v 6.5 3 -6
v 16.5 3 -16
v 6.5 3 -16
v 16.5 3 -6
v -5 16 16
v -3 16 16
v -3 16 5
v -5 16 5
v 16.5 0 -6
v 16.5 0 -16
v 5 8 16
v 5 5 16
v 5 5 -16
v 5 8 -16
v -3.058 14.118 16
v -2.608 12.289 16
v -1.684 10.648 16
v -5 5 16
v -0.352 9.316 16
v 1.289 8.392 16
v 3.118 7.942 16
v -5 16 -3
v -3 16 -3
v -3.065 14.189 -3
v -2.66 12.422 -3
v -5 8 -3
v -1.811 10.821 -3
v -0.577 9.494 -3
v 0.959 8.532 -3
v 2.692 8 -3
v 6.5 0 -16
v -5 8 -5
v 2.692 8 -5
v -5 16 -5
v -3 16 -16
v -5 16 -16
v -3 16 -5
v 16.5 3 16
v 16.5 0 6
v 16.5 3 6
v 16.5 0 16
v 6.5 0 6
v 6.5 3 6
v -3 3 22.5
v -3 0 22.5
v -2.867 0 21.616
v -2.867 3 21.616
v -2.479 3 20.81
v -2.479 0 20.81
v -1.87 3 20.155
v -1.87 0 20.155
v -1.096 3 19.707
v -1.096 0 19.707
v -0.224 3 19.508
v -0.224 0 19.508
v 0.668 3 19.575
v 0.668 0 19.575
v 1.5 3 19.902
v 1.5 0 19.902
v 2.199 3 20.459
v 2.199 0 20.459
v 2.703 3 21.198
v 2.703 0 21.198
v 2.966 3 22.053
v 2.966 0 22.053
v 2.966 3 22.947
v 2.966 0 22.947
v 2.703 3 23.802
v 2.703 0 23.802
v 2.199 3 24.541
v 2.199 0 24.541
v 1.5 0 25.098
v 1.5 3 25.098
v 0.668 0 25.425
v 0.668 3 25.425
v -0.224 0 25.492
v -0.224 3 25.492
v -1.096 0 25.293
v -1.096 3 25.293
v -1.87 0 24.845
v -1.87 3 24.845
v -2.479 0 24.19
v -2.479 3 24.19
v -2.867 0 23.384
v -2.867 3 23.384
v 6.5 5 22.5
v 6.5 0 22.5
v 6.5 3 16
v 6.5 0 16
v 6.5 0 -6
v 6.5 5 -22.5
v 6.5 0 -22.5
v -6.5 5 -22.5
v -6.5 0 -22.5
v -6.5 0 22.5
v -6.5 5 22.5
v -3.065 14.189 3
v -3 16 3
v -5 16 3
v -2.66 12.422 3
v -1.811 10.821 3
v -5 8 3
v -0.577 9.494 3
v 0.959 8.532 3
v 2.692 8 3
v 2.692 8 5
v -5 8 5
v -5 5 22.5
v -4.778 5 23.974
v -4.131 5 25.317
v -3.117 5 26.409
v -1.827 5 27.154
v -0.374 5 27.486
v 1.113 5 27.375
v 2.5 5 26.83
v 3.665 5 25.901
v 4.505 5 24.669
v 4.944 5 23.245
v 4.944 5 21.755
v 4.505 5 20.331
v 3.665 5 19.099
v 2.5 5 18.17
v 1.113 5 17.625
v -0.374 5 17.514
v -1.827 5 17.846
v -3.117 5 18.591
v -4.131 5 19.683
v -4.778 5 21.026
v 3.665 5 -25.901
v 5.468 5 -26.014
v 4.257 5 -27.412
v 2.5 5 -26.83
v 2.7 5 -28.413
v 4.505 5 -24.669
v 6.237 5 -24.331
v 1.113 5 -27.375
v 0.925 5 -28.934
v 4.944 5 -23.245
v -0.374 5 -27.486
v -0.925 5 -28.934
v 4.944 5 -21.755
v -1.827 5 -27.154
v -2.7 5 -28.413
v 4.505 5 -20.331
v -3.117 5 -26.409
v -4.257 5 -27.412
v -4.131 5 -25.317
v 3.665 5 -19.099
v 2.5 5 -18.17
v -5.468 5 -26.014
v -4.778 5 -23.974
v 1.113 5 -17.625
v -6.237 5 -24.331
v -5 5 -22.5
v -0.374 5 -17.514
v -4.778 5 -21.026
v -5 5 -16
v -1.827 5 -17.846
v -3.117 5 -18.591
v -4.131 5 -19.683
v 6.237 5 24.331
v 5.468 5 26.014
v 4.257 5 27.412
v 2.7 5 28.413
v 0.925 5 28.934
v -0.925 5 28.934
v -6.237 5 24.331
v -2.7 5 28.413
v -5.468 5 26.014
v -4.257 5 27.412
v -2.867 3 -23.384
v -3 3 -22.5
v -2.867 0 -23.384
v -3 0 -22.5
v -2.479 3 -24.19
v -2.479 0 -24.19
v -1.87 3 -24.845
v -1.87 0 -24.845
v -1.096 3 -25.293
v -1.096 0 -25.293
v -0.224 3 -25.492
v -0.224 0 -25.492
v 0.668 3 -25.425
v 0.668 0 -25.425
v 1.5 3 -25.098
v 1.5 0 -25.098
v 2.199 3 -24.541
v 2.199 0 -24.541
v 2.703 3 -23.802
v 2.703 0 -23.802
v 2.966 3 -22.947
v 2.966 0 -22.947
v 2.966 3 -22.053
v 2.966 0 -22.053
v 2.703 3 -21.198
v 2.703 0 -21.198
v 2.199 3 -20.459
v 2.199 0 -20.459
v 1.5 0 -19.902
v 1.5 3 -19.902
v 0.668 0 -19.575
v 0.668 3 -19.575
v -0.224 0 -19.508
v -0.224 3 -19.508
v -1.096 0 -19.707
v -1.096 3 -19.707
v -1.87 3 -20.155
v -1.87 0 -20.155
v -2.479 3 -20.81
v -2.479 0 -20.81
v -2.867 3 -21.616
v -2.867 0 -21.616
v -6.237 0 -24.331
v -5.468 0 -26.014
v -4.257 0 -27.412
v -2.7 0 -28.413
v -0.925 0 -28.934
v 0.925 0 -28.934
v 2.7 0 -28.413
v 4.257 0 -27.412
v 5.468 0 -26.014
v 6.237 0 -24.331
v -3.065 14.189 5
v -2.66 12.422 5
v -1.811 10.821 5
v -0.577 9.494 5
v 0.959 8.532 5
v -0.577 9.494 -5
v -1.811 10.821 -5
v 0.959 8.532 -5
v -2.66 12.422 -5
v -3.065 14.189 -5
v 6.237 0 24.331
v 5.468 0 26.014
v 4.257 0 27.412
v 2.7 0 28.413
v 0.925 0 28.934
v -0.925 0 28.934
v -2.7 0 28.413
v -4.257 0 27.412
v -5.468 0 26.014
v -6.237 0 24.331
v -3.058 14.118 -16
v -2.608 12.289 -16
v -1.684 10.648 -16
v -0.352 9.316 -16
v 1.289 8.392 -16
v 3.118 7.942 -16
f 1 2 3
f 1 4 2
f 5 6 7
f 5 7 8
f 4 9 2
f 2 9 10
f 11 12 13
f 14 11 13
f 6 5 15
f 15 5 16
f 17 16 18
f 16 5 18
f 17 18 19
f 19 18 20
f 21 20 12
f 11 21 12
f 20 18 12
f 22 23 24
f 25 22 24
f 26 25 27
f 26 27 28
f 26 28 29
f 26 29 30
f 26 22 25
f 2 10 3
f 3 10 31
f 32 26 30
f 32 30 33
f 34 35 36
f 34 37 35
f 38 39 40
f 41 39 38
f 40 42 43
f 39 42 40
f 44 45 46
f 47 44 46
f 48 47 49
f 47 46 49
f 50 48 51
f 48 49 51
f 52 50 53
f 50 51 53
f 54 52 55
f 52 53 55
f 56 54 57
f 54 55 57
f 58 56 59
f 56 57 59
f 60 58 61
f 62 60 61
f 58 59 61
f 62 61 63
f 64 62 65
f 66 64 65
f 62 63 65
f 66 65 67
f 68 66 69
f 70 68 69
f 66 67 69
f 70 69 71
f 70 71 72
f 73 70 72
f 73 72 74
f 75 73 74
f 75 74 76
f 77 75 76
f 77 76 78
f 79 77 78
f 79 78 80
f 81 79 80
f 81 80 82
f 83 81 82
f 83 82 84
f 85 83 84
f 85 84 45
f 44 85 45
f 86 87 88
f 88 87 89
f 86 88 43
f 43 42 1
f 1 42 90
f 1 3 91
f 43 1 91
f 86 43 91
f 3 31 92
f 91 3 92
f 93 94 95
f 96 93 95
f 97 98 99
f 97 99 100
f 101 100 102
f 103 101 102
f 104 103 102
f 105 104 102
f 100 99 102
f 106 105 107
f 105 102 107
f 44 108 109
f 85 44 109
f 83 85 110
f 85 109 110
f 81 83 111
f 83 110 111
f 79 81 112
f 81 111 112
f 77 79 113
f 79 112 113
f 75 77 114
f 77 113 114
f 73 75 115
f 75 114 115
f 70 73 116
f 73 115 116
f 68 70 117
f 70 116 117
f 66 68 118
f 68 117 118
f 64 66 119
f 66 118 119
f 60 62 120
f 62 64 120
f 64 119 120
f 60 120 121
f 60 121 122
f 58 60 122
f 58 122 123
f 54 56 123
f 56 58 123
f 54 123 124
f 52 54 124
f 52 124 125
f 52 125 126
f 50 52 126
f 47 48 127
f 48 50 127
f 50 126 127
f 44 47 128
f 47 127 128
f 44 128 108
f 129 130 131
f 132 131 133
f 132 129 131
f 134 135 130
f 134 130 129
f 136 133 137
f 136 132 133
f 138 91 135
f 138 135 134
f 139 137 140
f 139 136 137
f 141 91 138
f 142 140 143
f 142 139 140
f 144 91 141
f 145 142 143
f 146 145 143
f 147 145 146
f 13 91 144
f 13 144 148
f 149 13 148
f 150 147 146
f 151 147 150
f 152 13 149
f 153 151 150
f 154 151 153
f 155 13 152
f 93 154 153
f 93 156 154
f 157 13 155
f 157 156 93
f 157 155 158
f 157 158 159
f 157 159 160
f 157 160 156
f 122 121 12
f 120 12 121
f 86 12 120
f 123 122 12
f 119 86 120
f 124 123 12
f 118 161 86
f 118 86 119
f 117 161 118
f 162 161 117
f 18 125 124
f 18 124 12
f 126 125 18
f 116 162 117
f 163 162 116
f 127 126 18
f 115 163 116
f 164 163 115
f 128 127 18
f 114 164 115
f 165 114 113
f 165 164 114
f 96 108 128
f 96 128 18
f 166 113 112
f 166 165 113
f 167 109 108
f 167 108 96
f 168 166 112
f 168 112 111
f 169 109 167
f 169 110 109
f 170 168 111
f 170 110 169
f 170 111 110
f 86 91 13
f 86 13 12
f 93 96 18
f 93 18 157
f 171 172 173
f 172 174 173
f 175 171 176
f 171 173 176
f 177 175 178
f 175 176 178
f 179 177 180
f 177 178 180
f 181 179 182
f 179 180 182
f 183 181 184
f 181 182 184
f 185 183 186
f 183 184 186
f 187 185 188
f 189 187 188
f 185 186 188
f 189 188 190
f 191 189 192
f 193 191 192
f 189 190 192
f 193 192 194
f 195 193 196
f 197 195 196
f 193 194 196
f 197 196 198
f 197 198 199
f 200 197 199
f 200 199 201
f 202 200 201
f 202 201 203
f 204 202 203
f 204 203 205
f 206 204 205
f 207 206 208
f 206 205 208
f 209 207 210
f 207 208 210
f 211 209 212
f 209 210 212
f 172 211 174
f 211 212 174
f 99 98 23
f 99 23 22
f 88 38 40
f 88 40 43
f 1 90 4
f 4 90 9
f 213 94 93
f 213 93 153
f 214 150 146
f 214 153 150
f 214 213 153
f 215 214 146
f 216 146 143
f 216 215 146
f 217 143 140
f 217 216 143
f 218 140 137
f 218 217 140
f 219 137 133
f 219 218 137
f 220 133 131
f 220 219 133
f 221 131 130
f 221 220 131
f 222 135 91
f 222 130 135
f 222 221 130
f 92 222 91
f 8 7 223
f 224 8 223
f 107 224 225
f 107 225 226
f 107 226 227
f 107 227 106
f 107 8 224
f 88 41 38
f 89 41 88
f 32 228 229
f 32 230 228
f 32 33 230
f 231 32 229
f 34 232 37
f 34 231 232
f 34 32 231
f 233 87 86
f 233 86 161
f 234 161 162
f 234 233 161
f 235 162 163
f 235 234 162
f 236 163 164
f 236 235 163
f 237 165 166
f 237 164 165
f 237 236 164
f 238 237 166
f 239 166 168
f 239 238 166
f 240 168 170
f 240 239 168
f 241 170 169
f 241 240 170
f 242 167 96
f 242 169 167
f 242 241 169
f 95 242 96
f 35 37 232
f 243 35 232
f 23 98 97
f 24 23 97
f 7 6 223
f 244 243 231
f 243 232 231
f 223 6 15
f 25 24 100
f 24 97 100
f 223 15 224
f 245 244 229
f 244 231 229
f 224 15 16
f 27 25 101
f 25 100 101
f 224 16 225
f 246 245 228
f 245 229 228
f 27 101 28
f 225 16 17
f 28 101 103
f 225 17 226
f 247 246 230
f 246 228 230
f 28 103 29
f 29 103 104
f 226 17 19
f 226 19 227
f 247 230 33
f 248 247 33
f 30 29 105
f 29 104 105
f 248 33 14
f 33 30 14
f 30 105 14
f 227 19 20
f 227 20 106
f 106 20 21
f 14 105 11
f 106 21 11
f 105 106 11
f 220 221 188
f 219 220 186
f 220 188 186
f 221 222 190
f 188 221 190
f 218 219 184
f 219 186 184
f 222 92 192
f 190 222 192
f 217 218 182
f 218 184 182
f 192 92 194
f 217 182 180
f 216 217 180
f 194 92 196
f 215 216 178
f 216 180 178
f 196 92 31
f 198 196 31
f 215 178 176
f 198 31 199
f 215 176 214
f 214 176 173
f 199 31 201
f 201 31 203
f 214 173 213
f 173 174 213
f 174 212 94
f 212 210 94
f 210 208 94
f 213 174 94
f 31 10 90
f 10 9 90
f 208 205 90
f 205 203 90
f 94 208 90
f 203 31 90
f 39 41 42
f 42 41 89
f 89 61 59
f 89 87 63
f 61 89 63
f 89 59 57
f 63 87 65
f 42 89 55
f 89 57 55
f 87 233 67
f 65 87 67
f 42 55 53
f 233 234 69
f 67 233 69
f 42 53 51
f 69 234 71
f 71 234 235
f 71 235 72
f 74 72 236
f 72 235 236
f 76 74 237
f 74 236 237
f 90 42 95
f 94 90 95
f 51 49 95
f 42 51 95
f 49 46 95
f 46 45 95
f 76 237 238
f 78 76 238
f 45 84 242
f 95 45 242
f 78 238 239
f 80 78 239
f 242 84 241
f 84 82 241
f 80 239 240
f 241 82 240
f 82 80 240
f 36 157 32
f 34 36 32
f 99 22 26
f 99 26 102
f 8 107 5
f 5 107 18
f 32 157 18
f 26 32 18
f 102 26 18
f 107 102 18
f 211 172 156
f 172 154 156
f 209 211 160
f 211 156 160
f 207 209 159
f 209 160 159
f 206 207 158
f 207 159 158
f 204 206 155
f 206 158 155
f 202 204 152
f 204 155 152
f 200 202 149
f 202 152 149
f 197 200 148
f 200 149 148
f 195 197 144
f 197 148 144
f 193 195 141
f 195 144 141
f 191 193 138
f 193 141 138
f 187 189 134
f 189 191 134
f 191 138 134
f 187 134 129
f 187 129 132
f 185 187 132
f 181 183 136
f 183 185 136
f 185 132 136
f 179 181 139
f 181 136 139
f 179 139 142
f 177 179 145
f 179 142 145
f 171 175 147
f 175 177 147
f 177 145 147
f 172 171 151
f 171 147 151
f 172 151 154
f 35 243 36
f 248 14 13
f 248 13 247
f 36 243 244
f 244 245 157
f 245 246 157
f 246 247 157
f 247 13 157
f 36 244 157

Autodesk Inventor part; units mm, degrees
ref_plane "YZ Plane" through (0, 0, 0) normal (1, 0, 0) x (0, 1, 0)
ref_plane "XZ Plane" through (0, 0, 0) normal (0, 1, 0) x (-1, 0, 0)
ref_plane "XY Plane" through (0, 0, 0) normal (0, 0, 1) x (1, 0, 0)
sketch "Sketch1" plane through (0, 0, 0) normal (0, 1, 0) x (-1, 0, 0)
  line L0 (-6.5, 22.5) -> (-6.5, -22.5)
  line L1 (-6.5, -22.5) -> (6.5, -22.5)
  line L2 (6.5, -22.5) -> (6.5, 22.5)
  line L3 (6.5, 22.5) -> (-6.5, 22.5)
  line L4 (-6.5, 22.5) -> (6.5, -22.5) construction
  line L5 (-6.5, -22.5) -> (6.5, 22.5) construction
  circle A0 centre (0, -22.5) radius 3
  circle A1 centre (0, -22.5) radius 6.5
  circle A2 centre (0, 22.5) radius 3
  circle A3 centre (0, 22.5) radius 6.5
  line L6 (-5, 16) -> (-5, -16)
  line L7 (-5, -16) -> (5, -16)
  line L8 (5, -16) -> (5, 16)
  line L9 (5, 16) -> (-5, 16)
  line L10 (-5, 16) -> (5, -16) construction
  line L11 (-5, -16) -> (5, 16) construction
  line L12 (-6.5, -16) -> (-6.5, -6)
  line L13 (-6.5, -6) -> (-16.5, -6)
  line L14 (-16.5, -6) -> (-16.5, -16)
  line L15 (-16.5, -16) -> (-6.5, -16)
  line L16 (-6.5, 16) -> (-6.5, 6)
  line L17 (-6.5, 6) -> (-16.5, 6)
  line L18 (-16.5, 6) -> (-16.5, 16)
  line L19 (-16.5, 16) -> (-6.5, 16)
  point P0 (0, 0)
  dimension "d0" = 45
  dimension "d1" = 13
  dimension "d2" = 6
  dimension "d3" = 6
  dimension "d4" = 10
  dimension "d5" = 10
  dimension "d6" = 10
  dimension "d7" = 10
  dimension "d8" = 10
extrude "Extrusion1" add sketch "Sketch1" along normal blind 5 contours A3 L9 L6 L7 A1 L0 | A3 L3 A2 | L3 A2 A3 | L2 A1 L7 L8 L9 A3 | A1 L1 A0 | L1 A0 A1
extrude "Extrusion2" add sketch "Sketch1" along normal blind 3 contours L0 L17 L18 L19 | L0 L15 L14 L13
extrude "Extrusion3" add sketch "Sketch1" along normal blind 16 contours L9 L8 L7 L6
sketch "Sketch2" plane through (-5, 5, 16) normal (0, 0, 1) x (1, 0, 0)
  line L0 (10, 11) -> (0, 11) projected
  line L1 (0, 11) -> (2, 11)
  line L2 (10, 0) -> (10, 11) projected
  line L3 (11.5, 0) -> (-1.5, 0) projected
  line L4 (0, 0) -> (0, 11) projected
  arc A0 (2, 11) -> (10, 3) centre (8.8459, 9.8459) ccw
  point P0 (5, -5)
  point P1 (3, 6.101)
  dimension "d15" = 2
  dimension "d16" = 3
  dimension "d17" = 5
  dimension "d18" = 3
extrude "Extrusion4" cut sketch "Sketch2" against normal through all contours L2 A0 L0
sketch "Sketch3" plane through (-5, 5, 16) normal (-1, 0, 0) x (0, 0, 1)
  line L0 (0, 11) -> (-32, 11) projected
  line L1 (-32, 11) -> (0, 11) projected
  line L2 (0, 0) -> (0, 11) projected
  line L3 (-38.5, 0) -> (6.5, 0) projected
  line L4 (-19, 11) -> (-19, 3)
  line L5 (-19, 3) -> (-32, 3)
  line L6 (-13, 11) -> (-13, 3)
  line L7 (-13, 3) -> (0, 3)
  line L8 (-32, 3) -> (-19, 3)
  line L9 (-19, 3) -> (-19, 11)
  line L10 (-19, 11) -> (-32, 11)
  line L11 (-32, 11) -> (-32, 3)
  line L12 (-13, 3) -> (0, 3)
  line L13 (0, 3) -> (0, 11)
  line L14 (0, 11) -> (-13, 11)
  line L15 (-13, 11) -> (-13, 3)
  line L16 (-21, 3) -> (-21, 11)
  line L17 (-11, 11) -> (-11, 3)
  point P0 (-16, -5)
  point P1 (-16, 11)
  point P2 (-16, 11)
  point P3 (-16, 11)
  point P4 (-11, 3)
  dimension "d21" = 3
  dimension "d22" = 3
  dimension "d23" = 3
  dimension "d24" = 3
  dimension "d25" = 32
  dimension "d26" = 2
  dimension "d27" = 2
extrude "Extrusion5" cut sketch "Sketch3" against normal blind 10 contours L4 L5 L16 L0 | L17 L7 L6 L0
chamfer "Chamfer1" distance 2 angle 45 2 edges at (3, 5, -22.5) (3, 5, 22.5)
properties part number "string_holderWPNB"
